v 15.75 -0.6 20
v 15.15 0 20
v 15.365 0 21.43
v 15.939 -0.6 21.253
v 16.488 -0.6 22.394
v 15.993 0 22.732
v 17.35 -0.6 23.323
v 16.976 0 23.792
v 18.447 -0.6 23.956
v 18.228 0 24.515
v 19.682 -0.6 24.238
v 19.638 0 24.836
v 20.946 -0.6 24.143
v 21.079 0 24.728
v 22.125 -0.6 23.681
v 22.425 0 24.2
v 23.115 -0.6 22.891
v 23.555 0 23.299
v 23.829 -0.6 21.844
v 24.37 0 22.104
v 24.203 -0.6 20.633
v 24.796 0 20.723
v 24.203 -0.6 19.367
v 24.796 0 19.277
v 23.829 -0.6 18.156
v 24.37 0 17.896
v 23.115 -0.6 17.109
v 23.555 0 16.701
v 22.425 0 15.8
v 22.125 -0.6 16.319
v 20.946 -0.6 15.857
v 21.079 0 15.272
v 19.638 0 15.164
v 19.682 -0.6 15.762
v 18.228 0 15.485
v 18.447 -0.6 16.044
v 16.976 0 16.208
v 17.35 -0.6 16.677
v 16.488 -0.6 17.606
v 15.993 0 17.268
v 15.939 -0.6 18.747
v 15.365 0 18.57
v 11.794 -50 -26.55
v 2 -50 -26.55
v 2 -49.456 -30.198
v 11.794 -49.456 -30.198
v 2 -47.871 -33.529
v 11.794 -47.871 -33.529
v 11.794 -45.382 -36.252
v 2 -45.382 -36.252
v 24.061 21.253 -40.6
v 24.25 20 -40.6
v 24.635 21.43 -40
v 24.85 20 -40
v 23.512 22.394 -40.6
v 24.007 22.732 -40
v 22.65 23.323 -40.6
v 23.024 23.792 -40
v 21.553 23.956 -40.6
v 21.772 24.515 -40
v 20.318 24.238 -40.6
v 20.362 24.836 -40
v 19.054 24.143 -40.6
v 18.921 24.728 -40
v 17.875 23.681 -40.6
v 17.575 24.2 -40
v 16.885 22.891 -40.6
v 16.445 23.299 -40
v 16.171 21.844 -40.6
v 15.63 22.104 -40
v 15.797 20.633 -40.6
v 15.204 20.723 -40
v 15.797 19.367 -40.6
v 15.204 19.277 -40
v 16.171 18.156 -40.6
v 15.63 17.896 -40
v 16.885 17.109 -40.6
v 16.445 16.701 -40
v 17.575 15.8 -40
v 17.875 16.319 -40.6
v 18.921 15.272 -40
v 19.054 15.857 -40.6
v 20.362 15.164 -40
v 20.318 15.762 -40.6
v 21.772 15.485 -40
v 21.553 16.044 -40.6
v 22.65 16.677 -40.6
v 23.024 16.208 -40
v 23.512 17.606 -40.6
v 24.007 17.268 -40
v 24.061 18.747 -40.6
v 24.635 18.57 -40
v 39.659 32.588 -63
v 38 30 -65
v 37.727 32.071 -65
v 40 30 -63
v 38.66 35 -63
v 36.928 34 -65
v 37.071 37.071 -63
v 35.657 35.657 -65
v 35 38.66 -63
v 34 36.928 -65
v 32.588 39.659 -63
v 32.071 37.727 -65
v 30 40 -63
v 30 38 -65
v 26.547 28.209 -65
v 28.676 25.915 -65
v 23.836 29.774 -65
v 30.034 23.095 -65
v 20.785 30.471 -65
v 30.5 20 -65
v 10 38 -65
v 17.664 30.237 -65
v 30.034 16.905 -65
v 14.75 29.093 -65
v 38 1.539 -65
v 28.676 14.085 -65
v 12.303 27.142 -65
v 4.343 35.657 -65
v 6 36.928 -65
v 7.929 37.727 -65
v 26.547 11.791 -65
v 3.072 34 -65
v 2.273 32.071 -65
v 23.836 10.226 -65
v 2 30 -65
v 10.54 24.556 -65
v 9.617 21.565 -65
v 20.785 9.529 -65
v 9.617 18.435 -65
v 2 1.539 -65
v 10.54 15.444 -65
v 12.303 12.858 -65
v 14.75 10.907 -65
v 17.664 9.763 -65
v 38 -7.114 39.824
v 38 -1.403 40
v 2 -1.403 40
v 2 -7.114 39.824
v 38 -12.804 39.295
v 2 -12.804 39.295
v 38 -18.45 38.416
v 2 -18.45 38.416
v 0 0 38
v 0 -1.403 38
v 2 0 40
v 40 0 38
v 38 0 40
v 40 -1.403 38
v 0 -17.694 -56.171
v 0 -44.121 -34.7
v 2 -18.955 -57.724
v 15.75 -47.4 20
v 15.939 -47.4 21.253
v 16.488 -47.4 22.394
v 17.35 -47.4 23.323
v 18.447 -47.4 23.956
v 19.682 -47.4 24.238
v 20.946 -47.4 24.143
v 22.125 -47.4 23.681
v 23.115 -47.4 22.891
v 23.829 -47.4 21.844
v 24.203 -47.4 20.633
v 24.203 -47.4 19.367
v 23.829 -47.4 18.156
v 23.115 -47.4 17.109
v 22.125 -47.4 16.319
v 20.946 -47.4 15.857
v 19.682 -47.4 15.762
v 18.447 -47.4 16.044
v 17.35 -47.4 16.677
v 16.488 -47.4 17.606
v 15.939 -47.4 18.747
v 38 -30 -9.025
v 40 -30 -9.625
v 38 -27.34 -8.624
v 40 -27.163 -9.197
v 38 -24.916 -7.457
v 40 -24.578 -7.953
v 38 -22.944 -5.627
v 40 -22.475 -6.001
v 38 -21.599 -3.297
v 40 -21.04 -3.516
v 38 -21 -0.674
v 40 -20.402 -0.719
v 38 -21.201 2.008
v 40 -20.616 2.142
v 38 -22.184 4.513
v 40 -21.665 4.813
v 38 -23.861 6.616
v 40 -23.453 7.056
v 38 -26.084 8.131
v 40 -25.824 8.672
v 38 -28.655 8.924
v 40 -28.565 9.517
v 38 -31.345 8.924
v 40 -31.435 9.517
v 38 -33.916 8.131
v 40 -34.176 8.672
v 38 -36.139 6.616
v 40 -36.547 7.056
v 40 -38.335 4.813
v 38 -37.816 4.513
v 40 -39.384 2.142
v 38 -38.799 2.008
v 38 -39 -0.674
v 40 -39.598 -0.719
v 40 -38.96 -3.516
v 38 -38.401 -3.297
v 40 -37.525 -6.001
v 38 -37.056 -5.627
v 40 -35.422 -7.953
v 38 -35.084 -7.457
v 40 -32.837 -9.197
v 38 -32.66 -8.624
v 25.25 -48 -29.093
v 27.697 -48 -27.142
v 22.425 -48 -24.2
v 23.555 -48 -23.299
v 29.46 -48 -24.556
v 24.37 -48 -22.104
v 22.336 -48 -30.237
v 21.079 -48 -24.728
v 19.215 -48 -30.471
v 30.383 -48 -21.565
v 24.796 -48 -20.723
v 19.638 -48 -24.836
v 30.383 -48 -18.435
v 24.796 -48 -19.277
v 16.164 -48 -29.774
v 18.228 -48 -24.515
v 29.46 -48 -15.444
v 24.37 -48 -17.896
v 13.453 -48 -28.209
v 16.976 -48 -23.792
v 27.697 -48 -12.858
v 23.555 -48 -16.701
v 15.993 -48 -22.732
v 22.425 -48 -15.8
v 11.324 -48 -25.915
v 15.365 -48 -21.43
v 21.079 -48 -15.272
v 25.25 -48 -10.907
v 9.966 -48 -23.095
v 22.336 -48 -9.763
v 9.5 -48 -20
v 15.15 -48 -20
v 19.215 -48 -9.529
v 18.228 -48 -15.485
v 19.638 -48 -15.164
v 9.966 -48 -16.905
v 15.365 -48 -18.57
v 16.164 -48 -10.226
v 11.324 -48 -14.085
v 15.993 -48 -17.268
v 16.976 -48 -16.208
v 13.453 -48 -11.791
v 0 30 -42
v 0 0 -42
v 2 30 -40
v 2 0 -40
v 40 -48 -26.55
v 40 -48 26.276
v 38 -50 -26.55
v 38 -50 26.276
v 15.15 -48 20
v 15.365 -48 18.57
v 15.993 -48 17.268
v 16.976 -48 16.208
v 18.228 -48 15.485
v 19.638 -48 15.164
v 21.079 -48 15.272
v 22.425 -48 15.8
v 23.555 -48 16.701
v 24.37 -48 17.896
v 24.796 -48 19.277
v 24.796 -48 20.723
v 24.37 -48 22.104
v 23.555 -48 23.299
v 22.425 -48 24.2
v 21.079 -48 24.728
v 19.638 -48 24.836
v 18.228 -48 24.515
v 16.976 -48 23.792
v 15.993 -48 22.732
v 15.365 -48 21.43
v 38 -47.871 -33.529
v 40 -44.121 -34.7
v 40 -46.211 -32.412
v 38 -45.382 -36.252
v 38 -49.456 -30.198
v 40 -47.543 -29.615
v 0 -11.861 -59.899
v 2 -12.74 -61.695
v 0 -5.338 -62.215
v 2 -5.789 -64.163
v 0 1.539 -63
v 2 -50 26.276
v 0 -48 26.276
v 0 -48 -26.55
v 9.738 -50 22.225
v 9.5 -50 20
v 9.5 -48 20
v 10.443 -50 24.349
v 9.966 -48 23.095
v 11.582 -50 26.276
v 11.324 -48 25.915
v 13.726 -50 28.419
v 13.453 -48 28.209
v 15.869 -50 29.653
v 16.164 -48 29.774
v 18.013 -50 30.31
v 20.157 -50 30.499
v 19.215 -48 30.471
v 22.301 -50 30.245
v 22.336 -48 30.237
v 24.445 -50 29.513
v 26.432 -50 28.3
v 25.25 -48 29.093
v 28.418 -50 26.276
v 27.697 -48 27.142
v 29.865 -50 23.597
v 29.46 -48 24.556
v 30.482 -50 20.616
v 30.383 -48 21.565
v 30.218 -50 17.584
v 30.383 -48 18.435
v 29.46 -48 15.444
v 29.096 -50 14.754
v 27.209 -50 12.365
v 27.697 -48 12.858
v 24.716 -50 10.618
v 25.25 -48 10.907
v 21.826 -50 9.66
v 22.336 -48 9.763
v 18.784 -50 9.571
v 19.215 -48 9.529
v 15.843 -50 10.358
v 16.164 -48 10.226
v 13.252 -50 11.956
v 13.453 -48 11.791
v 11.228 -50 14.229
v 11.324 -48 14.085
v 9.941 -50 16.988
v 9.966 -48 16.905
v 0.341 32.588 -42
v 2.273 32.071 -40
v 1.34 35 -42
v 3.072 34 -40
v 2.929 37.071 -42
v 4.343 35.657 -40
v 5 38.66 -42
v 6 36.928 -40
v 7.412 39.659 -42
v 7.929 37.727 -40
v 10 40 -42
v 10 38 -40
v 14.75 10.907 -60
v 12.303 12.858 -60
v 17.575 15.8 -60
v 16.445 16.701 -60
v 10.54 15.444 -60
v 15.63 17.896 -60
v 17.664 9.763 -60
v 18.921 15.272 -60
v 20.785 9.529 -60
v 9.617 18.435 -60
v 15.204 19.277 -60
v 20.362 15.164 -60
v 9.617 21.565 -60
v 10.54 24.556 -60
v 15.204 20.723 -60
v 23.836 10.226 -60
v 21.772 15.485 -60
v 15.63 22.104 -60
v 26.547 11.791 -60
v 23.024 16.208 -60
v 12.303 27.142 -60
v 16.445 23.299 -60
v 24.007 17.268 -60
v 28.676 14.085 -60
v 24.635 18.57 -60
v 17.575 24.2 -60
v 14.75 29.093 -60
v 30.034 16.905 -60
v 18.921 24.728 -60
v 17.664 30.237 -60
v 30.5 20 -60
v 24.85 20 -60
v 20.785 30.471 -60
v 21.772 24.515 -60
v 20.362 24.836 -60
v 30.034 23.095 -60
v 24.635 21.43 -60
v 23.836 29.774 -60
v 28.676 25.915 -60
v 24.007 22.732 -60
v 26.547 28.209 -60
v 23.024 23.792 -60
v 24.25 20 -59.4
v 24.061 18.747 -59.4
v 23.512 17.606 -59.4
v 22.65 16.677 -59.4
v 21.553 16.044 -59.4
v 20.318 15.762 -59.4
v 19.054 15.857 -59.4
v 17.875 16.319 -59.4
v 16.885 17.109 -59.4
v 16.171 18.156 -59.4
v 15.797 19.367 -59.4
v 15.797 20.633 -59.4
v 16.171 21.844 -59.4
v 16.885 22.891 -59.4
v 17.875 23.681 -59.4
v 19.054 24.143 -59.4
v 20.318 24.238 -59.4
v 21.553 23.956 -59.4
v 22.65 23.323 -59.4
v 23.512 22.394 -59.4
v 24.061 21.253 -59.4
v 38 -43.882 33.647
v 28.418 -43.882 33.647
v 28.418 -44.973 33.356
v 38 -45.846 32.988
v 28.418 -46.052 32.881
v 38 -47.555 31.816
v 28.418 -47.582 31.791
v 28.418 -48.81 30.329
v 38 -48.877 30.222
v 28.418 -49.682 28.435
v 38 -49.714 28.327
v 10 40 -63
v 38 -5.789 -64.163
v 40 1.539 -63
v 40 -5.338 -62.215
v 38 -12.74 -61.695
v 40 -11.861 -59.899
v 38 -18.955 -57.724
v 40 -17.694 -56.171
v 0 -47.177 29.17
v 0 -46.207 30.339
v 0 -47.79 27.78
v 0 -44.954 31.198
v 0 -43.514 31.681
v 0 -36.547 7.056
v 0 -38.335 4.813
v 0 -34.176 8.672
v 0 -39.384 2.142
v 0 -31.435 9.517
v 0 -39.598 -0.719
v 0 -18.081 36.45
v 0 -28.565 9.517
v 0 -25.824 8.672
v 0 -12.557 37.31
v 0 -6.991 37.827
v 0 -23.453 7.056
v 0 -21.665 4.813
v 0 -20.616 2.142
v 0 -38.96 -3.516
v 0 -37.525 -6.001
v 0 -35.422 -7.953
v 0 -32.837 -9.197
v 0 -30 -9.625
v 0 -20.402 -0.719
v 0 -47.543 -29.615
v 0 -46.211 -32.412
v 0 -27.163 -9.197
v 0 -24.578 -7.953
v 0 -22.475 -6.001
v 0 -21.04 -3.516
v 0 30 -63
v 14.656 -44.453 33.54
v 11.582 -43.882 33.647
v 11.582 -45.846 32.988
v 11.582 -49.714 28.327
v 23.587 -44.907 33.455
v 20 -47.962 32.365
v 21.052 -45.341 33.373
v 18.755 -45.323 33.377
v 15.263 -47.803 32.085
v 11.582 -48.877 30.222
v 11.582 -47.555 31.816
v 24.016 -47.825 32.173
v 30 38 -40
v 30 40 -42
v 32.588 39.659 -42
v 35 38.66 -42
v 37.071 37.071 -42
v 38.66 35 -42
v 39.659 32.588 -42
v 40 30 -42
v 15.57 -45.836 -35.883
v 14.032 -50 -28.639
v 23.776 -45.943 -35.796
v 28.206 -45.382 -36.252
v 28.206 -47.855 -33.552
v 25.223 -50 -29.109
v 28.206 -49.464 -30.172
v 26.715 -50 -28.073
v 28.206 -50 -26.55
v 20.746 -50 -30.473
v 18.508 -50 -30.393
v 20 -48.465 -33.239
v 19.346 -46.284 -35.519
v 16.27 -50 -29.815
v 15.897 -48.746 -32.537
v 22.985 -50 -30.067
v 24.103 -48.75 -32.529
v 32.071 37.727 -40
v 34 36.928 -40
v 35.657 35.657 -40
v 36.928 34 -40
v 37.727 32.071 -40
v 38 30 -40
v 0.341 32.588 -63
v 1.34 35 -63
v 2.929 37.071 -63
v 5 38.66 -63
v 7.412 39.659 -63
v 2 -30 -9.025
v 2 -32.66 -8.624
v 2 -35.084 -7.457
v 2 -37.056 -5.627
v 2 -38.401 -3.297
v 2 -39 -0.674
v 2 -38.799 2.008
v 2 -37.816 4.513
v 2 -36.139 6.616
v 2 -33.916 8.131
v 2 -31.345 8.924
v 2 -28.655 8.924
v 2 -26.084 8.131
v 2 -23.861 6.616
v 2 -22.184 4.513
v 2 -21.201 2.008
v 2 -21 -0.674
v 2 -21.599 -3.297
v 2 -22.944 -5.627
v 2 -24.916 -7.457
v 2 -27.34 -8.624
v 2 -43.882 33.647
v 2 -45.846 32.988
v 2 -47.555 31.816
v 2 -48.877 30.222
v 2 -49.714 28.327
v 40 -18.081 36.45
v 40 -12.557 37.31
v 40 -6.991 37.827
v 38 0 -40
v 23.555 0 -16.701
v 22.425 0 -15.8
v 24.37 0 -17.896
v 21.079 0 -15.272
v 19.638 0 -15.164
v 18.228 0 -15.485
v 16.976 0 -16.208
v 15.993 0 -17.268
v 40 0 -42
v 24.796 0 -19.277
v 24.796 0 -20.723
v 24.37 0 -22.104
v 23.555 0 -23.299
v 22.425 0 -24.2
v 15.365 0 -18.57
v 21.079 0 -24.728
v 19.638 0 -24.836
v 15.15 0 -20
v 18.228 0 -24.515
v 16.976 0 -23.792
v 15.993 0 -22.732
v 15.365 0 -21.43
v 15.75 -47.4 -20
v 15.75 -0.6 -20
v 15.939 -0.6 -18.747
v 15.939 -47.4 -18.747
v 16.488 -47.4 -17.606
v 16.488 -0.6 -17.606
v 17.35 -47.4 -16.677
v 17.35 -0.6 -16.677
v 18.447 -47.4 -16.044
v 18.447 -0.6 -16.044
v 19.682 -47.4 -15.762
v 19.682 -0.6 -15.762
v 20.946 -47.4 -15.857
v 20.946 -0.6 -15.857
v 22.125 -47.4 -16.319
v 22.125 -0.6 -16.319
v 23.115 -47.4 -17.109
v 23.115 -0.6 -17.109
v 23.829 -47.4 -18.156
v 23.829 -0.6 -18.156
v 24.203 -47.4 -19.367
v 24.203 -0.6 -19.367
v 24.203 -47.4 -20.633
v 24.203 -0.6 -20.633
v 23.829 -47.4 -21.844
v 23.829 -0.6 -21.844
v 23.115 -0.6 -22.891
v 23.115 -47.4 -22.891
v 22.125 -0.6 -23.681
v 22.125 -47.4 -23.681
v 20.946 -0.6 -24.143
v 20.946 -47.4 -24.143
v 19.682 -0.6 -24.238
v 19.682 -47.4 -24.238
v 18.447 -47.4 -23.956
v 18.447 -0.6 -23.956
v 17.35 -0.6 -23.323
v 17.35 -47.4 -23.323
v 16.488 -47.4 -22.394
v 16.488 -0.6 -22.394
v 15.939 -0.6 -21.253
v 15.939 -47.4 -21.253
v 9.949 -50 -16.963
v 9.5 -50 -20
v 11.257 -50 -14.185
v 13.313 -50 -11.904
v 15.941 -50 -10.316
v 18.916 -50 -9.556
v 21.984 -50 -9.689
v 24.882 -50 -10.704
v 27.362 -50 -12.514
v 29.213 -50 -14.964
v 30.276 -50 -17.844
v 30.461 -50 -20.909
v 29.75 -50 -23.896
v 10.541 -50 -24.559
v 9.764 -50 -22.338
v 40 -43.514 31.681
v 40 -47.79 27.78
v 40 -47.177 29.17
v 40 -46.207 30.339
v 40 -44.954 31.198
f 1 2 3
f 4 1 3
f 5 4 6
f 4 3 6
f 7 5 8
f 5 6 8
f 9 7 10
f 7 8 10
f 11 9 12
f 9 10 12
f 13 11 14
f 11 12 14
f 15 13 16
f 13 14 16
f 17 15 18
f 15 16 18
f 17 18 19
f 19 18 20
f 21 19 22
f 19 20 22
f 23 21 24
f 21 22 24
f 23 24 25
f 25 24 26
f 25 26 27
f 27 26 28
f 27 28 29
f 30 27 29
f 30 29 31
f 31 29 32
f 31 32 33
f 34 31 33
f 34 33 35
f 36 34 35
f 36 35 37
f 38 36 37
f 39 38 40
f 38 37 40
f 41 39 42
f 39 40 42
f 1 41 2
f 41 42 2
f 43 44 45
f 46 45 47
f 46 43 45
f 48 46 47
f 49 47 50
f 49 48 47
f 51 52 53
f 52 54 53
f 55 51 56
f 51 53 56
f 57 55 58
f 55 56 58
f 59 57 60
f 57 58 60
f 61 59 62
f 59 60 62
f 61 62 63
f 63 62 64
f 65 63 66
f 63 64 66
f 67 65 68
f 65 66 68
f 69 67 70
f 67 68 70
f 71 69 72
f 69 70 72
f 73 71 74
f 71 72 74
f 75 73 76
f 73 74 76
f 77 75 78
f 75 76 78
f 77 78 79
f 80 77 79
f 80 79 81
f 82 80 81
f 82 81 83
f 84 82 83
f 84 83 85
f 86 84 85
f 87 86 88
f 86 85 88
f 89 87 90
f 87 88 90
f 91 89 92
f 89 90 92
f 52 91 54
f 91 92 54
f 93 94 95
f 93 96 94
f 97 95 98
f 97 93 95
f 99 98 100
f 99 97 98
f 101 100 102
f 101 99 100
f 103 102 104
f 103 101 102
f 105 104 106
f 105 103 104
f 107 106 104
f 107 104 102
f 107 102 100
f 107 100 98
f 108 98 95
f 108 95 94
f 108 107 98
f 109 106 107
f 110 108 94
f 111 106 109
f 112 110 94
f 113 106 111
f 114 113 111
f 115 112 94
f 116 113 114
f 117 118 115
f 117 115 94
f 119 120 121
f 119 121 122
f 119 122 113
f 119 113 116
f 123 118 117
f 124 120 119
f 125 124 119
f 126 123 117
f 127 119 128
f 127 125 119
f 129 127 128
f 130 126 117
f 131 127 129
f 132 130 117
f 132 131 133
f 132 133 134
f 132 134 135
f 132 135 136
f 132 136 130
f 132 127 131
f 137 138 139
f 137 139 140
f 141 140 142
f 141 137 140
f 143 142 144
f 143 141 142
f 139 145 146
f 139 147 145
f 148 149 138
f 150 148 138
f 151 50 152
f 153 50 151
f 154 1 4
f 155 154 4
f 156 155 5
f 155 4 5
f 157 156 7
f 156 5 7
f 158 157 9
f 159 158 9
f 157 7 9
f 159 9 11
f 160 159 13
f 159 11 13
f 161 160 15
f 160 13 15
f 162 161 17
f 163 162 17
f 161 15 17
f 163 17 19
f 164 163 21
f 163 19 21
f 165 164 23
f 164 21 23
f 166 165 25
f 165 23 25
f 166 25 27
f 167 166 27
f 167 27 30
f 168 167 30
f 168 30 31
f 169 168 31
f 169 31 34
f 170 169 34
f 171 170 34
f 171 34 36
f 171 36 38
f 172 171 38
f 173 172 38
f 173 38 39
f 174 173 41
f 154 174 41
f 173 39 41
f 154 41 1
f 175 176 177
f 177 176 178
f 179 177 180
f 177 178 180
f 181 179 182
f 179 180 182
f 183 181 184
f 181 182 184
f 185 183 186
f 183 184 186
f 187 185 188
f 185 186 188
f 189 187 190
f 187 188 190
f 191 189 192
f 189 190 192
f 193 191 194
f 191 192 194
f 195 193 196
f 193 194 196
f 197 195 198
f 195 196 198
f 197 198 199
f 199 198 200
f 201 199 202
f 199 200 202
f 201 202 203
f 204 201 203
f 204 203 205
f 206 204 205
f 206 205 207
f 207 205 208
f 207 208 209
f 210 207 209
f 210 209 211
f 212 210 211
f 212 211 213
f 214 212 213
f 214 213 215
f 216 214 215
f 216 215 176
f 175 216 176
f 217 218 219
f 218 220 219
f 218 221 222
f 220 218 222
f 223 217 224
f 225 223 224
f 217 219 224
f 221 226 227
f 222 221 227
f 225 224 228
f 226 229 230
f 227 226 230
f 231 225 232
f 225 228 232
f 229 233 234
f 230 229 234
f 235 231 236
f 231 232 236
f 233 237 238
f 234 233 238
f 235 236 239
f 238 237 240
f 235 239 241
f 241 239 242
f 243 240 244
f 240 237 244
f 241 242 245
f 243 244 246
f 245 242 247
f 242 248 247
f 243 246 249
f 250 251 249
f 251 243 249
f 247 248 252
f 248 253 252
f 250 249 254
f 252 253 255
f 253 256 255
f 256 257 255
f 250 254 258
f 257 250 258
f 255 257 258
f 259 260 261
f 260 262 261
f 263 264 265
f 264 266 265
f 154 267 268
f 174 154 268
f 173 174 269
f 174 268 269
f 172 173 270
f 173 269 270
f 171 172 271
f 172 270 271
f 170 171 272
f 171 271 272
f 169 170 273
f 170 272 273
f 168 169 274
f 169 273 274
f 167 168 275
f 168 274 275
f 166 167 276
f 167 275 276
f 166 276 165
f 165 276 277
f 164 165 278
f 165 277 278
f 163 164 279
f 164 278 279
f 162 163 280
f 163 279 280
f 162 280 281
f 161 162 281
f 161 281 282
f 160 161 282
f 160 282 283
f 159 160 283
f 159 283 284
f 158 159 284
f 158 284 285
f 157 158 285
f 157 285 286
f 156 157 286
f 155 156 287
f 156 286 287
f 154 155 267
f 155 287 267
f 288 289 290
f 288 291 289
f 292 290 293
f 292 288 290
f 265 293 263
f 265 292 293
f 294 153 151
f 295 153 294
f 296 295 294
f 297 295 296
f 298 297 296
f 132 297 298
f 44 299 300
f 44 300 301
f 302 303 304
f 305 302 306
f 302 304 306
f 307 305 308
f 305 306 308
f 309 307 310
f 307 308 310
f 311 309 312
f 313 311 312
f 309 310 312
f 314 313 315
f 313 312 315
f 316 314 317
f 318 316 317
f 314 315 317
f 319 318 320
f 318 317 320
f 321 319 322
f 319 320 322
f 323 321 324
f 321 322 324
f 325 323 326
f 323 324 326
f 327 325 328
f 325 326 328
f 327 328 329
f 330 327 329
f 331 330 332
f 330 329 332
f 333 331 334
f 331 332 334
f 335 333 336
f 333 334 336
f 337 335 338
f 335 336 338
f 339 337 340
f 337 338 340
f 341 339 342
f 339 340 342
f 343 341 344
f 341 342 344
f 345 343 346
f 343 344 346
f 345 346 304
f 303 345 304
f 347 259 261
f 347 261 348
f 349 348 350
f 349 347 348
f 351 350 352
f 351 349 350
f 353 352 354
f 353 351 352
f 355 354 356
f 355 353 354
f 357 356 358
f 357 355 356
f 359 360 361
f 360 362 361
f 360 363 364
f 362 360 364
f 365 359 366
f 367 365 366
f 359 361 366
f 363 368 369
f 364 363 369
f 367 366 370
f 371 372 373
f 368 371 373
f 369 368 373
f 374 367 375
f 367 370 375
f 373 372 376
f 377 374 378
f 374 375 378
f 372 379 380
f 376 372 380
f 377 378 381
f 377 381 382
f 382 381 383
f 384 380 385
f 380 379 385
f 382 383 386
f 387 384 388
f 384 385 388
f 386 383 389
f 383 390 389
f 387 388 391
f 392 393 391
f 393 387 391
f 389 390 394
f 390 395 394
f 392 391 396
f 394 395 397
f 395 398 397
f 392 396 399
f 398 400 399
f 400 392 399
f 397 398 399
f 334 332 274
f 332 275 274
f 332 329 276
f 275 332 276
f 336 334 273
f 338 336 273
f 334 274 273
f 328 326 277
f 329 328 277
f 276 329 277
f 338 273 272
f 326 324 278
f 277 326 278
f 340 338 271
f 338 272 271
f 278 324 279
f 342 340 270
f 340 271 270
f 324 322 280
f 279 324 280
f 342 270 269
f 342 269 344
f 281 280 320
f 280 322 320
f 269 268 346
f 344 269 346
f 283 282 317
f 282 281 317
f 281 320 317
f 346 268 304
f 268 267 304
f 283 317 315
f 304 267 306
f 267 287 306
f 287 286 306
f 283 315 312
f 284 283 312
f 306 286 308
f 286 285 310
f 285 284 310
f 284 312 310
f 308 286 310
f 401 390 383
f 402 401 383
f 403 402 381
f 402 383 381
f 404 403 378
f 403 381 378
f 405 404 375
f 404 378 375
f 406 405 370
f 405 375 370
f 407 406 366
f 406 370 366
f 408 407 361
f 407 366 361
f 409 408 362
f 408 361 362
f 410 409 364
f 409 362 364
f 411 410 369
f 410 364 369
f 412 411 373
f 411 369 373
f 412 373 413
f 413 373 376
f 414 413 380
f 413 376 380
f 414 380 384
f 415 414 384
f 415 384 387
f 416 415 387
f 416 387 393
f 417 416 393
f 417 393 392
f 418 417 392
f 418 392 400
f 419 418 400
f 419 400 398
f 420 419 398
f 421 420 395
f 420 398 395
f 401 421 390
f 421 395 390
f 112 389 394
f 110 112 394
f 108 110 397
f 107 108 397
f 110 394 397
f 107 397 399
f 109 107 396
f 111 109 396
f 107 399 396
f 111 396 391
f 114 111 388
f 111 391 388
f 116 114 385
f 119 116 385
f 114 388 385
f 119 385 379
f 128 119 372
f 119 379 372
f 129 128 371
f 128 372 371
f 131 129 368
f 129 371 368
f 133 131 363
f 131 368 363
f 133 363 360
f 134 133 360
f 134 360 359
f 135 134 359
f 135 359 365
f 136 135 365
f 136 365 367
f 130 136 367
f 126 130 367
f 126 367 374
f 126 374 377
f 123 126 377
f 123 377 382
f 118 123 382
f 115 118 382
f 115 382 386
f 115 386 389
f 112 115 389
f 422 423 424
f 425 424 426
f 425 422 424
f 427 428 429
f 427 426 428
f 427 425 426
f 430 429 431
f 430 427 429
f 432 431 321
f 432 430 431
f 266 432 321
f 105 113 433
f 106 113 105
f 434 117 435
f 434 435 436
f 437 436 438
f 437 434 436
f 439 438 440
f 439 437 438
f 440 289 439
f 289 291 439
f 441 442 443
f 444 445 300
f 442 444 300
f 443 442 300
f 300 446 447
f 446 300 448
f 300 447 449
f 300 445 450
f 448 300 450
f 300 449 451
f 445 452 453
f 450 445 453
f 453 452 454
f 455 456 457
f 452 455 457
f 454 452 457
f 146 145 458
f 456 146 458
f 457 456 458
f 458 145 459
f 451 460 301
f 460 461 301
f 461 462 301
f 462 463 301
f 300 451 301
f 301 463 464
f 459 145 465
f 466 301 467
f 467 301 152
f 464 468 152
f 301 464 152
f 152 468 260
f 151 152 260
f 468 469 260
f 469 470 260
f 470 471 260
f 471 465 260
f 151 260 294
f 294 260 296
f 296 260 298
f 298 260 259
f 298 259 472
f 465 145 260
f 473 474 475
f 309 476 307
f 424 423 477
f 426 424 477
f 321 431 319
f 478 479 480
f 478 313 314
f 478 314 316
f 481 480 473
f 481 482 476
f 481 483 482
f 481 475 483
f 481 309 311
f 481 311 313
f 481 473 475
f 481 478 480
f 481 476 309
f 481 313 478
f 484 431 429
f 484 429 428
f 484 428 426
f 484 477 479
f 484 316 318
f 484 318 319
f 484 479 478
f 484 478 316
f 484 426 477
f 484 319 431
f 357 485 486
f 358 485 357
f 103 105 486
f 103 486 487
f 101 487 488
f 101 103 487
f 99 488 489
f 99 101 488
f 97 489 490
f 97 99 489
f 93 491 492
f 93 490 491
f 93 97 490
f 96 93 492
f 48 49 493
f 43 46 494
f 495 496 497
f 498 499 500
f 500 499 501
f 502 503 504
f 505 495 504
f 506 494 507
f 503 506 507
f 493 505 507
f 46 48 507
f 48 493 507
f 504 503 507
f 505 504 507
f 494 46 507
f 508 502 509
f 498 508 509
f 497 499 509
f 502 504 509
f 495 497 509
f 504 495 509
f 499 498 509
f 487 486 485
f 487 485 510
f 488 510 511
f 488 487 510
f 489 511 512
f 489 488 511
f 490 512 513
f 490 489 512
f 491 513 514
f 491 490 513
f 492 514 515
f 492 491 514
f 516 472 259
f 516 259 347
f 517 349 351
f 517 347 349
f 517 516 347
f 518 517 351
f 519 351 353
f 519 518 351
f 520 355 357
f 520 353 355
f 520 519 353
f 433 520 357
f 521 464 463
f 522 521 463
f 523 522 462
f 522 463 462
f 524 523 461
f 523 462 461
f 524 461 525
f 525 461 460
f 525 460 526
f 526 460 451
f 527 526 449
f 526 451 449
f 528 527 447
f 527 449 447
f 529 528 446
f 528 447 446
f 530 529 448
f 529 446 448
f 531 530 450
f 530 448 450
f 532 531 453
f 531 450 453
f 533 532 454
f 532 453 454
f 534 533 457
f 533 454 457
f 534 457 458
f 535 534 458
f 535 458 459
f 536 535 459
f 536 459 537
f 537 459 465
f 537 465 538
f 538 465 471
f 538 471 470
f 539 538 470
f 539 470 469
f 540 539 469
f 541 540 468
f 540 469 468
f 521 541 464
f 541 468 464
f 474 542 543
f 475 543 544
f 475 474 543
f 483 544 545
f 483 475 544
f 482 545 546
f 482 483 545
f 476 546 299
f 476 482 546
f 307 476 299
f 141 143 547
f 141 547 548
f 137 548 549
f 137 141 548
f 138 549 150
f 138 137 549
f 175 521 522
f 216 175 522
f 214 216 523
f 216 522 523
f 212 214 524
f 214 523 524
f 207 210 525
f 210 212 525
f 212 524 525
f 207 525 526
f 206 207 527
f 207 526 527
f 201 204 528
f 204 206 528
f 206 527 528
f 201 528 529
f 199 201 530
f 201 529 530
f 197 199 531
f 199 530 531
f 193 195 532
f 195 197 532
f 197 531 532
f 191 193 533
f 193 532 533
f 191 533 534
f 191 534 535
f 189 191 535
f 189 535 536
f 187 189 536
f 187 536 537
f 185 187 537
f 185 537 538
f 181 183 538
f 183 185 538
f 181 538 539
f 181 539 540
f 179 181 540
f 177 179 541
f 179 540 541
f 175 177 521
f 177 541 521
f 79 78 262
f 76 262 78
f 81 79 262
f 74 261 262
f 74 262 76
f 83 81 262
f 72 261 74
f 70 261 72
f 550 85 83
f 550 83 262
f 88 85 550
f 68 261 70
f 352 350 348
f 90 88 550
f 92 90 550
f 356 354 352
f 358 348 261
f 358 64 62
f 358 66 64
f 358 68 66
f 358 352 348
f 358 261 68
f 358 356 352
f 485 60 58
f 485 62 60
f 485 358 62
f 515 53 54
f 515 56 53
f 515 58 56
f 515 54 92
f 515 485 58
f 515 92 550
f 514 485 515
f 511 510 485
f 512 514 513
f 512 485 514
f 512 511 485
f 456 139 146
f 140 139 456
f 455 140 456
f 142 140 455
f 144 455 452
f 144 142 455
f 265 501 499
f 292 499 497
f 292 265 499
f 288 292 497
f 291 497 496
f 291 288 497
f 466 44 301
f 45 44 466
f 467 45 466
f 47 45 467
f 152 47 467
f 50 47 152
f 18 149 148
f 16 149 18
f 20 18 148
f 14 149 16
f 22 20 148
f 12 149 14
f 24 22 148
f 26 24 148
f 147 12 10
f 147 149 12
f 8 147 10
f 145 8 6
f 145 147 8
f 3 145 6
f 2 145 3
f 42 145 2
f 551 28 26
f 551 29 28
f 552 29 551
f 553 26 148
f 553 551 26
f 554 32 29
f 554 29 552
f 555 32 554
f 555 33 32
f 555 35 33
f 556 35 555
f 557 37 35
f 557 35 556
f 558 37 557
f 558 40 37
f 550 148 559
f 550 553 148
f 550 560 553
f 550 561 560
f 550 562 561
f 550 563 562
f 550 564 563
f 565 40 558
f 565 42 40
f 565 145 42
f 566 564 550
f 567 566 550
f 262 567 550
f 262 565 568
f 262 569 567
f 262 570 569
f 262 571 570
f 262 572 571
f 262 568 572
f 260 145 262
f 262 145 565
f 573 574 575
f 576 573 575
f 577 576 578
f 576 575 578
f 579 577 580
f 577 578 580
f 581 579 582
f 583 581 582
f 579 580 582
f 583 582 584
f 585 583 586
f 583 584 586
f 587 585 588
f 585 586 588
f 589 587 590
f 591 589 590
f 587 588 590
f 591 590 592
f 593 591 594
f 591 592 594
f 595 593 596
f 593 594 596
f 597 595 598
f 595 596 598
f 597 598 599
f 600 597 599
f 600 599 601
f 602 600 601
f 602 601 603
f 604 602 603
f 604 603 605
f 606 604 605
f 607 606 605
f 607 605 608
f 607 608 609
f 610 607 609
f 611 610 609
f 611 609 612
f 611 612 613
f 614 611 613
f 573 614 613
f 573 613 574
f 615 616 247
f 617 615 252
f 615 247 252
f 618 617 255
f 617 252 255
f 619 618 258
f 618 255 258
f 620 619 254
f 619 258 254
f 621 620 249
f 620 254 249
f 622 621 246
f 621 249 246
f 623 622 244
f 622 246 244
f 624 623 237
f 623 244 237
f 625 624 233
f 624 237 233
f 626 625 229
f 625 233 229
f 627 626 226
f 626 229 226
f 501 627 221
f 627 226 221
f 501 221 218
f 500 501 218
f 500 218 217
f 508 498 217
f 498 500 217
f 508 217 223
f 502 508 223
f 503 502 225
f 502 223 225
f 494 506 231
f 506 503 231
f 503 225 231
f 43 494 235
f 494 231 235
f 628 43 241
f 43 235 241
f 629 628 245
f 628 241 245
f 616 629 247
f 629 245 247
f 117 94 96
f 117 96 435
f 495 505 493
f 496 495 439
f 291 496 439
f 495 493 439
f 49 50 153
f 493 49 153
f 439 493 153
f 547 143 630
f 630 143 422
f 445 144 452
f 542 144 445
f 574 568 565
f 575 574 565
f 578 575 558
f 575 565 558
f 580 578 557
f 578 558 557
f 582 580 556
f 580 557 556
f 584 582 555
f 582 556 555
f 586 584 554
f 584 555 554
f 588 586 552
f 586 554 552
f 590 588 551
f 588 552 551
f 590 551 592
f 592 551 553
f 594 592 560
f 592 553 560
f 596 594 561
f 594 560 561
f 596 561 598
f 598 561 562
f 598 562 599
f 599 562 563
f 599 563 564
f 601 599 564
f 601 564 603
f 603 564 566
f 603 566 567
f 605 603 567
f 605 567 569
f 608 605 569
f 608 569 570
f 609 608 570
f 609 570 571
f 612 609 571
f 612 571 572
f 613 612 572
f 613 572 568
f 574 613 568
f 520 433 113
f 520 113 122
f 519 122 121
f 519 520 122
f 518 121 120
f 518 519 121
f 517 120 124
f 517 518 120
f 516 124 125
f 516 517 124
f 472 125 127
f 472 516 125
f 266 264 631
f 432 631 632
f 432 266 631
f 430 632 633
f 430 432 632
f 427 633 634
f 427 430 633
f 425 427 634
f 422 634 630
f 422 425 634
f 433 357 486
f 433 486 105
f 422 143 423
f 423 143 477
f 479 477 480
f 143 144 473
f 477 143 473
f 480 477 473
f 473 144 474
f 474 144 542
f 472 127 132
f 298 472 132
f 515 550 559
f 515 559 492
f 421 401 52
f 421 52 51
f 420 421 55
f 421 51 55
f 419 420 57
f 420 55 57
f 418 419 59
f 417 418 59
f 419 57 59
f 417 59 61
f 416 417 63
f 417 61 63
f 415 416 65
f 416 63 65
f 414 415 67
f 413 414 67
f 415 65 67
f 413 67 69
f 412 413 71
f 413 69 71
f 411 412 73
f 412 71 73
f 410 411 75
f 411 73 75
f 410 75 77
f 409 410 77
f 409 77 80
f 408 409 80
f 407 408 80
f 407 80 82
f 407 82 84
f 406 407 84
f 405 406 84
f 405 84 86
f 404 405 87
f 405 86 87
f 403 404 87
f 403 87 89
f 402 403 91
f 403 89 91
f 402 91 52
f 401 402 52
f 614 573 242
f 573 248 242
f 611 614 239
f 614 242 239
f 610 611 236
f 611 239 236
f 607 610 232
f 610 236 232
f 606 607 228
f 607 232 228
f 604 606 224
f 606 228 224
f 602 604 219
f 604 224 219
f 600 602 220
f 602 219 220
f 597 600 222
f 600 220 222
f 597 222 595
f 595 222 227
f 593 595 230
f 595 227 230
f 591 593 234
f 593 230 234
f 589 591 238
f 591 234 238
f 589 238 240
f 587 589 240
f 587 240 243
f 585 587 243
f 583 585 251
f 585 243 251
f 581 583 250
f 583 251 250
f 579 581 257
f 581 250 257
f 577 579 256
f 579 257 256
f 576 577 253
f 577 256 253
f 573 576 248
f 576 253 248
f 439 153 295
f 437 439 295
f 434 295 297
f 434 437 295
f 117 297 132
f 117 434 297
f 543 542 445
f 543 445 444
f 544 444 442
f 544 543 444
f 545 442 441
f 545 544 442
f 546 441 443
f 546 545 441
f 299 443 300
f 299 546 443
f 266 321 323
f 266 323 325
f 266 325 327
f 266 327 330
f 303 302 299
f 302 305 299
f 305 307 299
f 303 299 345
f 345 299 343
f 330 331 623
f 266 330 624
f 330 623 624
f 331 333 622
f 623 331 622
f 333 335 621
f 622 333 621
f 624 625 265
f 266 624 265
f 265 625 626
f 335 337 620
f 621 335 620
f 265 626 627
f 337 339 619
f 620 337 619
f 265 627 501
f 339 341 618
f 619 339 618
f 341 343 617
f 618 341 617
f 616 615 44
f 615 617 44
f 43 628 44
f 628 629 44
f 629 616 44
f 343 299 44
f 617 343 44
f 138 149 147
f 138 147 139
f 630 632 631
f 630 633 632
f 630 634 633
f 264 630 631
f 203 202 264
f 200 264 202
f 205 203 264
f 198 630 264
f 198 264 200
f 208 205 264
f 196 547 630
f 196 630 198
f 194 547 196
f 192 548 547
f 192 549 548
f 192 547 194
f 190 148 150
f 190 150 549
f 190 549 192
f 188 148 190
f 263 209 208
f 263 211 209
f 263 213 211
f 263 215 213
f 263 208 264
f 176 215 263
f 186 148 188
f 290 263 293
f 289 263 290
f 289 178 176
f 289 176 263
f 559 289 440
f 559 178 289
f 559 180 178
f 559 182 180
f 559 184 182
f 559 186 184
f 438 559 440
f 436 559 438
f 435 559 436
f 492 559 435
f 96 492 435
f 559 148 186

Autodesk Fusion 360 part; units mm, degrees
sketch "Sketch7" plane through (0, 0, 0) normal (1, 0, 0) x (0, 0, -1)
  line L0 (-40, 0) -> (40, 0)
  line L1 (40, 0) -> (40, 40)
  line L2 (40, 40) -> (65, 40)
  line L3 (65, 40) -> (65, -10)
  line L4 (-40, 0) -> (-40, -10)
  line L5 (0, 0) -> (0, -30) construction
  circle A0 centre (0, -30) radius 9.025
  line L6 (-40, -10) -> (-32.5, -50)
  line L7 (-32.5, -50) -> (32.5, -50)
  line L8 (32.5, -50) -> (65, -10)
  dimension "d98" = 80
  dimension "d99" = 40
  dimension "d100" = 25
  dimension "d101" = 50
  dimension "d102" = 10
  dimension "d103" = 30
  dimension "d104" = 18.05
  dimension "d105" = 7.5
  dimension "d106" = 7.5
  dimension "d107" = 50
extrude "Extrude12" add sketch "Sketch7" along normal blind 40 makes body 1
sketch "Sketch8" plane through (0, 0, 0) normal (0, 1, 0) x (-1, 0, 0)
  line L0 (0, -40) -> (0, 40)
  line L1 (0, 40) -> (-40, 40)
  line L2 (-40, 40) -> (-40, -40)
  line L3 (-40, -40) -> (0, -40)
  line L4 (-40, 20) -> (0, 20) construction
  line L5 (0, -20) -> (-40, -20) construction
  circle A0 centre (-20, 20) radius 10.5
  circle A1 centre (-20, 20) radius 4.25
  circle A2 centre (-20, -20) radius 10.5
  circle A3 centre (-20, -20) radius 4.25
  dimension "d110" = 20
  dimension "d111" = 20
  dimension "d112" = 21
  dimension "d113" = 8.5
extrude "Extrude13" cut sketch "Sketch8" against normal blind 65 contours A0 | A1 | A2 | A3 bodies 1
extrude "Extrude14" add sketch "Sketch8" against normal blind 48 contours A0 | A2 bodies 1
sketch "Sketch9" plane through (0, 0, -40) normal (0, 0, 1) x (1, 0, 0)
  line L0 (0, 40) -> (0, 0)
  line L1 (0, 0) -> (40, 0)
  line L2 (40, 0) -> (40, 40)
  line L3 (40, 40) -> (0, 40)
  line L4 (0, 40) -> (40, 0) construction
  circle A0 centre (20, 20) radius 10.5
  circle A1 centre (20, 20) radius 4.25
  dimension "d118" = 21
  dimension "d119" = 8.5
extrude "Extrude15" cut sketch "Sketch9" against normal blind 25 contours A0 | A1 bodies 1
extrude "Extrude16" add sketch "Sketch9" against normal blind 20 contours A0 bodies 1
fillet "Fillet6" radius 7.5 1 edges at (20, -50, 32.5) on bodies 1
fillet "Fillet6" radius 92.5 1 edges at (20, -10, 40) on bodies 1
fillet "Fillet6" radius 12.5 1 edges at (20, -50, -32.5) on bodies 1
fillet "Fillet6" radius 32.5 1 edges at (20, -10, -65) on bodies 1
fillet "Fillet6" radius 10 2 edges at (40, 40, -52.5) (0, 40, -52.5) on bodies 1
chamfer "Chamfer2" distance 2 distance2 2 26 edges at (40, 15.7694, -65) (37.0711, 37.0711, -65) (20, 40, -65) (2.9289, 37.0711, -65) (0, 15.7694, -65) (0, -9.335, -63.127) (0, -32.1689, -46.9877) (0, -48.7867, -31.9225) (0, -50, -0.1374) (0, -48.2713, 31.0653) (0, -31.1659, 36.0314) (0, -9.9631, 39.6031) (0, -0.7015, 40) (40, -0.7015, 40) (40, -9.9631, 39.6031) (40, -31.1659, 36.0314) (40, -48.2713, 31.0653) (40, -50, -0.1374) (40, -48.7867, -31.9225) (40, -32.1689, -46.9877) (40, -9.335, -63.127) (37.0711, 37.0711, -40) (40, 15, -40) (0, 15, -40) (2.9289, 37.0711, -40) (20, 40, -40) measured on face at (40, -24.2407, -28.2919) measured on face at (30.4758, 39.9887, -48.3333) measured on face at (36.7942, 16.658, -65) measured on face at (9.5242, 39.9887, -48.3333) measured on face at (0, -24.2407, -28.2919) measured on face at (13.3333, -4.342, -64.4635) measured on face at (21.3822, -27.9314, -50.4307) measured on face at (3.9312, -49.9391, -27.7824) measured on face at (36.4044, -50, -5.0795) measured on face at (7.7211, -44.5562, 33.4882) measured on face at (21.8485, -27.0997, 36.7938) measured on face at (13.3333, -10.911, 39.51) measured on face at (26.6667, -0.4677, 40) measured on face at (40, -24.2407, -28.2919) measured on face at (13.3333, -10.911, 39.51) measured on face at (40, -24.2407, -28.2919) measured on face at (32.2789, -49.9654, 26.9948) measured on face at (40, -24.2407, -28.2919) measured on face at (32.1375, -47.1192, -34.5329) measured on face at (40, -24.2407, -28.2919) measured on face at (13.3333, -4.342, -64.4635) measured on face at (30.4758, 39.9887, -48.3333) measured on face at (40, -24.2407, -28.2919) measured on face at (0, -24.2407, -28.2919) measured on face at (9.5242, 39.9887, -48.3333) measured on face at (16.6667, 40, -48.3333) on bodies 1
chamfer "Chamfer2" distance 0.6 distance2 0.6 3 faces at (24.2447, 19.7882, -53.3333) (15.7553, -32, -20.2118) (15.7553, -32, 19.7882) on bodies 1
chamfer "Chamfer2" distance 0.6 distance2 2 1 edges at (40, -26.7364, 8.4143) measured on face at (40, -24.2407, -28.2919) on bodies 1
chamfer "Chamfer2" distance 2 distance2 0.6 1 edges at (0, -26.7364, 8.4143) measured on face at (26.6667, -30.4499, -9.0138) on bodies 1
copy_body "Body->Comp2" bodies 1 removing the originals makes body 2 in component "wheel stand hinge point"
component "wheel stand hinge point" placed x (1, 0, 0) y (0, 1, 0) z (0, 0, 1) at (0, 0, 0)
